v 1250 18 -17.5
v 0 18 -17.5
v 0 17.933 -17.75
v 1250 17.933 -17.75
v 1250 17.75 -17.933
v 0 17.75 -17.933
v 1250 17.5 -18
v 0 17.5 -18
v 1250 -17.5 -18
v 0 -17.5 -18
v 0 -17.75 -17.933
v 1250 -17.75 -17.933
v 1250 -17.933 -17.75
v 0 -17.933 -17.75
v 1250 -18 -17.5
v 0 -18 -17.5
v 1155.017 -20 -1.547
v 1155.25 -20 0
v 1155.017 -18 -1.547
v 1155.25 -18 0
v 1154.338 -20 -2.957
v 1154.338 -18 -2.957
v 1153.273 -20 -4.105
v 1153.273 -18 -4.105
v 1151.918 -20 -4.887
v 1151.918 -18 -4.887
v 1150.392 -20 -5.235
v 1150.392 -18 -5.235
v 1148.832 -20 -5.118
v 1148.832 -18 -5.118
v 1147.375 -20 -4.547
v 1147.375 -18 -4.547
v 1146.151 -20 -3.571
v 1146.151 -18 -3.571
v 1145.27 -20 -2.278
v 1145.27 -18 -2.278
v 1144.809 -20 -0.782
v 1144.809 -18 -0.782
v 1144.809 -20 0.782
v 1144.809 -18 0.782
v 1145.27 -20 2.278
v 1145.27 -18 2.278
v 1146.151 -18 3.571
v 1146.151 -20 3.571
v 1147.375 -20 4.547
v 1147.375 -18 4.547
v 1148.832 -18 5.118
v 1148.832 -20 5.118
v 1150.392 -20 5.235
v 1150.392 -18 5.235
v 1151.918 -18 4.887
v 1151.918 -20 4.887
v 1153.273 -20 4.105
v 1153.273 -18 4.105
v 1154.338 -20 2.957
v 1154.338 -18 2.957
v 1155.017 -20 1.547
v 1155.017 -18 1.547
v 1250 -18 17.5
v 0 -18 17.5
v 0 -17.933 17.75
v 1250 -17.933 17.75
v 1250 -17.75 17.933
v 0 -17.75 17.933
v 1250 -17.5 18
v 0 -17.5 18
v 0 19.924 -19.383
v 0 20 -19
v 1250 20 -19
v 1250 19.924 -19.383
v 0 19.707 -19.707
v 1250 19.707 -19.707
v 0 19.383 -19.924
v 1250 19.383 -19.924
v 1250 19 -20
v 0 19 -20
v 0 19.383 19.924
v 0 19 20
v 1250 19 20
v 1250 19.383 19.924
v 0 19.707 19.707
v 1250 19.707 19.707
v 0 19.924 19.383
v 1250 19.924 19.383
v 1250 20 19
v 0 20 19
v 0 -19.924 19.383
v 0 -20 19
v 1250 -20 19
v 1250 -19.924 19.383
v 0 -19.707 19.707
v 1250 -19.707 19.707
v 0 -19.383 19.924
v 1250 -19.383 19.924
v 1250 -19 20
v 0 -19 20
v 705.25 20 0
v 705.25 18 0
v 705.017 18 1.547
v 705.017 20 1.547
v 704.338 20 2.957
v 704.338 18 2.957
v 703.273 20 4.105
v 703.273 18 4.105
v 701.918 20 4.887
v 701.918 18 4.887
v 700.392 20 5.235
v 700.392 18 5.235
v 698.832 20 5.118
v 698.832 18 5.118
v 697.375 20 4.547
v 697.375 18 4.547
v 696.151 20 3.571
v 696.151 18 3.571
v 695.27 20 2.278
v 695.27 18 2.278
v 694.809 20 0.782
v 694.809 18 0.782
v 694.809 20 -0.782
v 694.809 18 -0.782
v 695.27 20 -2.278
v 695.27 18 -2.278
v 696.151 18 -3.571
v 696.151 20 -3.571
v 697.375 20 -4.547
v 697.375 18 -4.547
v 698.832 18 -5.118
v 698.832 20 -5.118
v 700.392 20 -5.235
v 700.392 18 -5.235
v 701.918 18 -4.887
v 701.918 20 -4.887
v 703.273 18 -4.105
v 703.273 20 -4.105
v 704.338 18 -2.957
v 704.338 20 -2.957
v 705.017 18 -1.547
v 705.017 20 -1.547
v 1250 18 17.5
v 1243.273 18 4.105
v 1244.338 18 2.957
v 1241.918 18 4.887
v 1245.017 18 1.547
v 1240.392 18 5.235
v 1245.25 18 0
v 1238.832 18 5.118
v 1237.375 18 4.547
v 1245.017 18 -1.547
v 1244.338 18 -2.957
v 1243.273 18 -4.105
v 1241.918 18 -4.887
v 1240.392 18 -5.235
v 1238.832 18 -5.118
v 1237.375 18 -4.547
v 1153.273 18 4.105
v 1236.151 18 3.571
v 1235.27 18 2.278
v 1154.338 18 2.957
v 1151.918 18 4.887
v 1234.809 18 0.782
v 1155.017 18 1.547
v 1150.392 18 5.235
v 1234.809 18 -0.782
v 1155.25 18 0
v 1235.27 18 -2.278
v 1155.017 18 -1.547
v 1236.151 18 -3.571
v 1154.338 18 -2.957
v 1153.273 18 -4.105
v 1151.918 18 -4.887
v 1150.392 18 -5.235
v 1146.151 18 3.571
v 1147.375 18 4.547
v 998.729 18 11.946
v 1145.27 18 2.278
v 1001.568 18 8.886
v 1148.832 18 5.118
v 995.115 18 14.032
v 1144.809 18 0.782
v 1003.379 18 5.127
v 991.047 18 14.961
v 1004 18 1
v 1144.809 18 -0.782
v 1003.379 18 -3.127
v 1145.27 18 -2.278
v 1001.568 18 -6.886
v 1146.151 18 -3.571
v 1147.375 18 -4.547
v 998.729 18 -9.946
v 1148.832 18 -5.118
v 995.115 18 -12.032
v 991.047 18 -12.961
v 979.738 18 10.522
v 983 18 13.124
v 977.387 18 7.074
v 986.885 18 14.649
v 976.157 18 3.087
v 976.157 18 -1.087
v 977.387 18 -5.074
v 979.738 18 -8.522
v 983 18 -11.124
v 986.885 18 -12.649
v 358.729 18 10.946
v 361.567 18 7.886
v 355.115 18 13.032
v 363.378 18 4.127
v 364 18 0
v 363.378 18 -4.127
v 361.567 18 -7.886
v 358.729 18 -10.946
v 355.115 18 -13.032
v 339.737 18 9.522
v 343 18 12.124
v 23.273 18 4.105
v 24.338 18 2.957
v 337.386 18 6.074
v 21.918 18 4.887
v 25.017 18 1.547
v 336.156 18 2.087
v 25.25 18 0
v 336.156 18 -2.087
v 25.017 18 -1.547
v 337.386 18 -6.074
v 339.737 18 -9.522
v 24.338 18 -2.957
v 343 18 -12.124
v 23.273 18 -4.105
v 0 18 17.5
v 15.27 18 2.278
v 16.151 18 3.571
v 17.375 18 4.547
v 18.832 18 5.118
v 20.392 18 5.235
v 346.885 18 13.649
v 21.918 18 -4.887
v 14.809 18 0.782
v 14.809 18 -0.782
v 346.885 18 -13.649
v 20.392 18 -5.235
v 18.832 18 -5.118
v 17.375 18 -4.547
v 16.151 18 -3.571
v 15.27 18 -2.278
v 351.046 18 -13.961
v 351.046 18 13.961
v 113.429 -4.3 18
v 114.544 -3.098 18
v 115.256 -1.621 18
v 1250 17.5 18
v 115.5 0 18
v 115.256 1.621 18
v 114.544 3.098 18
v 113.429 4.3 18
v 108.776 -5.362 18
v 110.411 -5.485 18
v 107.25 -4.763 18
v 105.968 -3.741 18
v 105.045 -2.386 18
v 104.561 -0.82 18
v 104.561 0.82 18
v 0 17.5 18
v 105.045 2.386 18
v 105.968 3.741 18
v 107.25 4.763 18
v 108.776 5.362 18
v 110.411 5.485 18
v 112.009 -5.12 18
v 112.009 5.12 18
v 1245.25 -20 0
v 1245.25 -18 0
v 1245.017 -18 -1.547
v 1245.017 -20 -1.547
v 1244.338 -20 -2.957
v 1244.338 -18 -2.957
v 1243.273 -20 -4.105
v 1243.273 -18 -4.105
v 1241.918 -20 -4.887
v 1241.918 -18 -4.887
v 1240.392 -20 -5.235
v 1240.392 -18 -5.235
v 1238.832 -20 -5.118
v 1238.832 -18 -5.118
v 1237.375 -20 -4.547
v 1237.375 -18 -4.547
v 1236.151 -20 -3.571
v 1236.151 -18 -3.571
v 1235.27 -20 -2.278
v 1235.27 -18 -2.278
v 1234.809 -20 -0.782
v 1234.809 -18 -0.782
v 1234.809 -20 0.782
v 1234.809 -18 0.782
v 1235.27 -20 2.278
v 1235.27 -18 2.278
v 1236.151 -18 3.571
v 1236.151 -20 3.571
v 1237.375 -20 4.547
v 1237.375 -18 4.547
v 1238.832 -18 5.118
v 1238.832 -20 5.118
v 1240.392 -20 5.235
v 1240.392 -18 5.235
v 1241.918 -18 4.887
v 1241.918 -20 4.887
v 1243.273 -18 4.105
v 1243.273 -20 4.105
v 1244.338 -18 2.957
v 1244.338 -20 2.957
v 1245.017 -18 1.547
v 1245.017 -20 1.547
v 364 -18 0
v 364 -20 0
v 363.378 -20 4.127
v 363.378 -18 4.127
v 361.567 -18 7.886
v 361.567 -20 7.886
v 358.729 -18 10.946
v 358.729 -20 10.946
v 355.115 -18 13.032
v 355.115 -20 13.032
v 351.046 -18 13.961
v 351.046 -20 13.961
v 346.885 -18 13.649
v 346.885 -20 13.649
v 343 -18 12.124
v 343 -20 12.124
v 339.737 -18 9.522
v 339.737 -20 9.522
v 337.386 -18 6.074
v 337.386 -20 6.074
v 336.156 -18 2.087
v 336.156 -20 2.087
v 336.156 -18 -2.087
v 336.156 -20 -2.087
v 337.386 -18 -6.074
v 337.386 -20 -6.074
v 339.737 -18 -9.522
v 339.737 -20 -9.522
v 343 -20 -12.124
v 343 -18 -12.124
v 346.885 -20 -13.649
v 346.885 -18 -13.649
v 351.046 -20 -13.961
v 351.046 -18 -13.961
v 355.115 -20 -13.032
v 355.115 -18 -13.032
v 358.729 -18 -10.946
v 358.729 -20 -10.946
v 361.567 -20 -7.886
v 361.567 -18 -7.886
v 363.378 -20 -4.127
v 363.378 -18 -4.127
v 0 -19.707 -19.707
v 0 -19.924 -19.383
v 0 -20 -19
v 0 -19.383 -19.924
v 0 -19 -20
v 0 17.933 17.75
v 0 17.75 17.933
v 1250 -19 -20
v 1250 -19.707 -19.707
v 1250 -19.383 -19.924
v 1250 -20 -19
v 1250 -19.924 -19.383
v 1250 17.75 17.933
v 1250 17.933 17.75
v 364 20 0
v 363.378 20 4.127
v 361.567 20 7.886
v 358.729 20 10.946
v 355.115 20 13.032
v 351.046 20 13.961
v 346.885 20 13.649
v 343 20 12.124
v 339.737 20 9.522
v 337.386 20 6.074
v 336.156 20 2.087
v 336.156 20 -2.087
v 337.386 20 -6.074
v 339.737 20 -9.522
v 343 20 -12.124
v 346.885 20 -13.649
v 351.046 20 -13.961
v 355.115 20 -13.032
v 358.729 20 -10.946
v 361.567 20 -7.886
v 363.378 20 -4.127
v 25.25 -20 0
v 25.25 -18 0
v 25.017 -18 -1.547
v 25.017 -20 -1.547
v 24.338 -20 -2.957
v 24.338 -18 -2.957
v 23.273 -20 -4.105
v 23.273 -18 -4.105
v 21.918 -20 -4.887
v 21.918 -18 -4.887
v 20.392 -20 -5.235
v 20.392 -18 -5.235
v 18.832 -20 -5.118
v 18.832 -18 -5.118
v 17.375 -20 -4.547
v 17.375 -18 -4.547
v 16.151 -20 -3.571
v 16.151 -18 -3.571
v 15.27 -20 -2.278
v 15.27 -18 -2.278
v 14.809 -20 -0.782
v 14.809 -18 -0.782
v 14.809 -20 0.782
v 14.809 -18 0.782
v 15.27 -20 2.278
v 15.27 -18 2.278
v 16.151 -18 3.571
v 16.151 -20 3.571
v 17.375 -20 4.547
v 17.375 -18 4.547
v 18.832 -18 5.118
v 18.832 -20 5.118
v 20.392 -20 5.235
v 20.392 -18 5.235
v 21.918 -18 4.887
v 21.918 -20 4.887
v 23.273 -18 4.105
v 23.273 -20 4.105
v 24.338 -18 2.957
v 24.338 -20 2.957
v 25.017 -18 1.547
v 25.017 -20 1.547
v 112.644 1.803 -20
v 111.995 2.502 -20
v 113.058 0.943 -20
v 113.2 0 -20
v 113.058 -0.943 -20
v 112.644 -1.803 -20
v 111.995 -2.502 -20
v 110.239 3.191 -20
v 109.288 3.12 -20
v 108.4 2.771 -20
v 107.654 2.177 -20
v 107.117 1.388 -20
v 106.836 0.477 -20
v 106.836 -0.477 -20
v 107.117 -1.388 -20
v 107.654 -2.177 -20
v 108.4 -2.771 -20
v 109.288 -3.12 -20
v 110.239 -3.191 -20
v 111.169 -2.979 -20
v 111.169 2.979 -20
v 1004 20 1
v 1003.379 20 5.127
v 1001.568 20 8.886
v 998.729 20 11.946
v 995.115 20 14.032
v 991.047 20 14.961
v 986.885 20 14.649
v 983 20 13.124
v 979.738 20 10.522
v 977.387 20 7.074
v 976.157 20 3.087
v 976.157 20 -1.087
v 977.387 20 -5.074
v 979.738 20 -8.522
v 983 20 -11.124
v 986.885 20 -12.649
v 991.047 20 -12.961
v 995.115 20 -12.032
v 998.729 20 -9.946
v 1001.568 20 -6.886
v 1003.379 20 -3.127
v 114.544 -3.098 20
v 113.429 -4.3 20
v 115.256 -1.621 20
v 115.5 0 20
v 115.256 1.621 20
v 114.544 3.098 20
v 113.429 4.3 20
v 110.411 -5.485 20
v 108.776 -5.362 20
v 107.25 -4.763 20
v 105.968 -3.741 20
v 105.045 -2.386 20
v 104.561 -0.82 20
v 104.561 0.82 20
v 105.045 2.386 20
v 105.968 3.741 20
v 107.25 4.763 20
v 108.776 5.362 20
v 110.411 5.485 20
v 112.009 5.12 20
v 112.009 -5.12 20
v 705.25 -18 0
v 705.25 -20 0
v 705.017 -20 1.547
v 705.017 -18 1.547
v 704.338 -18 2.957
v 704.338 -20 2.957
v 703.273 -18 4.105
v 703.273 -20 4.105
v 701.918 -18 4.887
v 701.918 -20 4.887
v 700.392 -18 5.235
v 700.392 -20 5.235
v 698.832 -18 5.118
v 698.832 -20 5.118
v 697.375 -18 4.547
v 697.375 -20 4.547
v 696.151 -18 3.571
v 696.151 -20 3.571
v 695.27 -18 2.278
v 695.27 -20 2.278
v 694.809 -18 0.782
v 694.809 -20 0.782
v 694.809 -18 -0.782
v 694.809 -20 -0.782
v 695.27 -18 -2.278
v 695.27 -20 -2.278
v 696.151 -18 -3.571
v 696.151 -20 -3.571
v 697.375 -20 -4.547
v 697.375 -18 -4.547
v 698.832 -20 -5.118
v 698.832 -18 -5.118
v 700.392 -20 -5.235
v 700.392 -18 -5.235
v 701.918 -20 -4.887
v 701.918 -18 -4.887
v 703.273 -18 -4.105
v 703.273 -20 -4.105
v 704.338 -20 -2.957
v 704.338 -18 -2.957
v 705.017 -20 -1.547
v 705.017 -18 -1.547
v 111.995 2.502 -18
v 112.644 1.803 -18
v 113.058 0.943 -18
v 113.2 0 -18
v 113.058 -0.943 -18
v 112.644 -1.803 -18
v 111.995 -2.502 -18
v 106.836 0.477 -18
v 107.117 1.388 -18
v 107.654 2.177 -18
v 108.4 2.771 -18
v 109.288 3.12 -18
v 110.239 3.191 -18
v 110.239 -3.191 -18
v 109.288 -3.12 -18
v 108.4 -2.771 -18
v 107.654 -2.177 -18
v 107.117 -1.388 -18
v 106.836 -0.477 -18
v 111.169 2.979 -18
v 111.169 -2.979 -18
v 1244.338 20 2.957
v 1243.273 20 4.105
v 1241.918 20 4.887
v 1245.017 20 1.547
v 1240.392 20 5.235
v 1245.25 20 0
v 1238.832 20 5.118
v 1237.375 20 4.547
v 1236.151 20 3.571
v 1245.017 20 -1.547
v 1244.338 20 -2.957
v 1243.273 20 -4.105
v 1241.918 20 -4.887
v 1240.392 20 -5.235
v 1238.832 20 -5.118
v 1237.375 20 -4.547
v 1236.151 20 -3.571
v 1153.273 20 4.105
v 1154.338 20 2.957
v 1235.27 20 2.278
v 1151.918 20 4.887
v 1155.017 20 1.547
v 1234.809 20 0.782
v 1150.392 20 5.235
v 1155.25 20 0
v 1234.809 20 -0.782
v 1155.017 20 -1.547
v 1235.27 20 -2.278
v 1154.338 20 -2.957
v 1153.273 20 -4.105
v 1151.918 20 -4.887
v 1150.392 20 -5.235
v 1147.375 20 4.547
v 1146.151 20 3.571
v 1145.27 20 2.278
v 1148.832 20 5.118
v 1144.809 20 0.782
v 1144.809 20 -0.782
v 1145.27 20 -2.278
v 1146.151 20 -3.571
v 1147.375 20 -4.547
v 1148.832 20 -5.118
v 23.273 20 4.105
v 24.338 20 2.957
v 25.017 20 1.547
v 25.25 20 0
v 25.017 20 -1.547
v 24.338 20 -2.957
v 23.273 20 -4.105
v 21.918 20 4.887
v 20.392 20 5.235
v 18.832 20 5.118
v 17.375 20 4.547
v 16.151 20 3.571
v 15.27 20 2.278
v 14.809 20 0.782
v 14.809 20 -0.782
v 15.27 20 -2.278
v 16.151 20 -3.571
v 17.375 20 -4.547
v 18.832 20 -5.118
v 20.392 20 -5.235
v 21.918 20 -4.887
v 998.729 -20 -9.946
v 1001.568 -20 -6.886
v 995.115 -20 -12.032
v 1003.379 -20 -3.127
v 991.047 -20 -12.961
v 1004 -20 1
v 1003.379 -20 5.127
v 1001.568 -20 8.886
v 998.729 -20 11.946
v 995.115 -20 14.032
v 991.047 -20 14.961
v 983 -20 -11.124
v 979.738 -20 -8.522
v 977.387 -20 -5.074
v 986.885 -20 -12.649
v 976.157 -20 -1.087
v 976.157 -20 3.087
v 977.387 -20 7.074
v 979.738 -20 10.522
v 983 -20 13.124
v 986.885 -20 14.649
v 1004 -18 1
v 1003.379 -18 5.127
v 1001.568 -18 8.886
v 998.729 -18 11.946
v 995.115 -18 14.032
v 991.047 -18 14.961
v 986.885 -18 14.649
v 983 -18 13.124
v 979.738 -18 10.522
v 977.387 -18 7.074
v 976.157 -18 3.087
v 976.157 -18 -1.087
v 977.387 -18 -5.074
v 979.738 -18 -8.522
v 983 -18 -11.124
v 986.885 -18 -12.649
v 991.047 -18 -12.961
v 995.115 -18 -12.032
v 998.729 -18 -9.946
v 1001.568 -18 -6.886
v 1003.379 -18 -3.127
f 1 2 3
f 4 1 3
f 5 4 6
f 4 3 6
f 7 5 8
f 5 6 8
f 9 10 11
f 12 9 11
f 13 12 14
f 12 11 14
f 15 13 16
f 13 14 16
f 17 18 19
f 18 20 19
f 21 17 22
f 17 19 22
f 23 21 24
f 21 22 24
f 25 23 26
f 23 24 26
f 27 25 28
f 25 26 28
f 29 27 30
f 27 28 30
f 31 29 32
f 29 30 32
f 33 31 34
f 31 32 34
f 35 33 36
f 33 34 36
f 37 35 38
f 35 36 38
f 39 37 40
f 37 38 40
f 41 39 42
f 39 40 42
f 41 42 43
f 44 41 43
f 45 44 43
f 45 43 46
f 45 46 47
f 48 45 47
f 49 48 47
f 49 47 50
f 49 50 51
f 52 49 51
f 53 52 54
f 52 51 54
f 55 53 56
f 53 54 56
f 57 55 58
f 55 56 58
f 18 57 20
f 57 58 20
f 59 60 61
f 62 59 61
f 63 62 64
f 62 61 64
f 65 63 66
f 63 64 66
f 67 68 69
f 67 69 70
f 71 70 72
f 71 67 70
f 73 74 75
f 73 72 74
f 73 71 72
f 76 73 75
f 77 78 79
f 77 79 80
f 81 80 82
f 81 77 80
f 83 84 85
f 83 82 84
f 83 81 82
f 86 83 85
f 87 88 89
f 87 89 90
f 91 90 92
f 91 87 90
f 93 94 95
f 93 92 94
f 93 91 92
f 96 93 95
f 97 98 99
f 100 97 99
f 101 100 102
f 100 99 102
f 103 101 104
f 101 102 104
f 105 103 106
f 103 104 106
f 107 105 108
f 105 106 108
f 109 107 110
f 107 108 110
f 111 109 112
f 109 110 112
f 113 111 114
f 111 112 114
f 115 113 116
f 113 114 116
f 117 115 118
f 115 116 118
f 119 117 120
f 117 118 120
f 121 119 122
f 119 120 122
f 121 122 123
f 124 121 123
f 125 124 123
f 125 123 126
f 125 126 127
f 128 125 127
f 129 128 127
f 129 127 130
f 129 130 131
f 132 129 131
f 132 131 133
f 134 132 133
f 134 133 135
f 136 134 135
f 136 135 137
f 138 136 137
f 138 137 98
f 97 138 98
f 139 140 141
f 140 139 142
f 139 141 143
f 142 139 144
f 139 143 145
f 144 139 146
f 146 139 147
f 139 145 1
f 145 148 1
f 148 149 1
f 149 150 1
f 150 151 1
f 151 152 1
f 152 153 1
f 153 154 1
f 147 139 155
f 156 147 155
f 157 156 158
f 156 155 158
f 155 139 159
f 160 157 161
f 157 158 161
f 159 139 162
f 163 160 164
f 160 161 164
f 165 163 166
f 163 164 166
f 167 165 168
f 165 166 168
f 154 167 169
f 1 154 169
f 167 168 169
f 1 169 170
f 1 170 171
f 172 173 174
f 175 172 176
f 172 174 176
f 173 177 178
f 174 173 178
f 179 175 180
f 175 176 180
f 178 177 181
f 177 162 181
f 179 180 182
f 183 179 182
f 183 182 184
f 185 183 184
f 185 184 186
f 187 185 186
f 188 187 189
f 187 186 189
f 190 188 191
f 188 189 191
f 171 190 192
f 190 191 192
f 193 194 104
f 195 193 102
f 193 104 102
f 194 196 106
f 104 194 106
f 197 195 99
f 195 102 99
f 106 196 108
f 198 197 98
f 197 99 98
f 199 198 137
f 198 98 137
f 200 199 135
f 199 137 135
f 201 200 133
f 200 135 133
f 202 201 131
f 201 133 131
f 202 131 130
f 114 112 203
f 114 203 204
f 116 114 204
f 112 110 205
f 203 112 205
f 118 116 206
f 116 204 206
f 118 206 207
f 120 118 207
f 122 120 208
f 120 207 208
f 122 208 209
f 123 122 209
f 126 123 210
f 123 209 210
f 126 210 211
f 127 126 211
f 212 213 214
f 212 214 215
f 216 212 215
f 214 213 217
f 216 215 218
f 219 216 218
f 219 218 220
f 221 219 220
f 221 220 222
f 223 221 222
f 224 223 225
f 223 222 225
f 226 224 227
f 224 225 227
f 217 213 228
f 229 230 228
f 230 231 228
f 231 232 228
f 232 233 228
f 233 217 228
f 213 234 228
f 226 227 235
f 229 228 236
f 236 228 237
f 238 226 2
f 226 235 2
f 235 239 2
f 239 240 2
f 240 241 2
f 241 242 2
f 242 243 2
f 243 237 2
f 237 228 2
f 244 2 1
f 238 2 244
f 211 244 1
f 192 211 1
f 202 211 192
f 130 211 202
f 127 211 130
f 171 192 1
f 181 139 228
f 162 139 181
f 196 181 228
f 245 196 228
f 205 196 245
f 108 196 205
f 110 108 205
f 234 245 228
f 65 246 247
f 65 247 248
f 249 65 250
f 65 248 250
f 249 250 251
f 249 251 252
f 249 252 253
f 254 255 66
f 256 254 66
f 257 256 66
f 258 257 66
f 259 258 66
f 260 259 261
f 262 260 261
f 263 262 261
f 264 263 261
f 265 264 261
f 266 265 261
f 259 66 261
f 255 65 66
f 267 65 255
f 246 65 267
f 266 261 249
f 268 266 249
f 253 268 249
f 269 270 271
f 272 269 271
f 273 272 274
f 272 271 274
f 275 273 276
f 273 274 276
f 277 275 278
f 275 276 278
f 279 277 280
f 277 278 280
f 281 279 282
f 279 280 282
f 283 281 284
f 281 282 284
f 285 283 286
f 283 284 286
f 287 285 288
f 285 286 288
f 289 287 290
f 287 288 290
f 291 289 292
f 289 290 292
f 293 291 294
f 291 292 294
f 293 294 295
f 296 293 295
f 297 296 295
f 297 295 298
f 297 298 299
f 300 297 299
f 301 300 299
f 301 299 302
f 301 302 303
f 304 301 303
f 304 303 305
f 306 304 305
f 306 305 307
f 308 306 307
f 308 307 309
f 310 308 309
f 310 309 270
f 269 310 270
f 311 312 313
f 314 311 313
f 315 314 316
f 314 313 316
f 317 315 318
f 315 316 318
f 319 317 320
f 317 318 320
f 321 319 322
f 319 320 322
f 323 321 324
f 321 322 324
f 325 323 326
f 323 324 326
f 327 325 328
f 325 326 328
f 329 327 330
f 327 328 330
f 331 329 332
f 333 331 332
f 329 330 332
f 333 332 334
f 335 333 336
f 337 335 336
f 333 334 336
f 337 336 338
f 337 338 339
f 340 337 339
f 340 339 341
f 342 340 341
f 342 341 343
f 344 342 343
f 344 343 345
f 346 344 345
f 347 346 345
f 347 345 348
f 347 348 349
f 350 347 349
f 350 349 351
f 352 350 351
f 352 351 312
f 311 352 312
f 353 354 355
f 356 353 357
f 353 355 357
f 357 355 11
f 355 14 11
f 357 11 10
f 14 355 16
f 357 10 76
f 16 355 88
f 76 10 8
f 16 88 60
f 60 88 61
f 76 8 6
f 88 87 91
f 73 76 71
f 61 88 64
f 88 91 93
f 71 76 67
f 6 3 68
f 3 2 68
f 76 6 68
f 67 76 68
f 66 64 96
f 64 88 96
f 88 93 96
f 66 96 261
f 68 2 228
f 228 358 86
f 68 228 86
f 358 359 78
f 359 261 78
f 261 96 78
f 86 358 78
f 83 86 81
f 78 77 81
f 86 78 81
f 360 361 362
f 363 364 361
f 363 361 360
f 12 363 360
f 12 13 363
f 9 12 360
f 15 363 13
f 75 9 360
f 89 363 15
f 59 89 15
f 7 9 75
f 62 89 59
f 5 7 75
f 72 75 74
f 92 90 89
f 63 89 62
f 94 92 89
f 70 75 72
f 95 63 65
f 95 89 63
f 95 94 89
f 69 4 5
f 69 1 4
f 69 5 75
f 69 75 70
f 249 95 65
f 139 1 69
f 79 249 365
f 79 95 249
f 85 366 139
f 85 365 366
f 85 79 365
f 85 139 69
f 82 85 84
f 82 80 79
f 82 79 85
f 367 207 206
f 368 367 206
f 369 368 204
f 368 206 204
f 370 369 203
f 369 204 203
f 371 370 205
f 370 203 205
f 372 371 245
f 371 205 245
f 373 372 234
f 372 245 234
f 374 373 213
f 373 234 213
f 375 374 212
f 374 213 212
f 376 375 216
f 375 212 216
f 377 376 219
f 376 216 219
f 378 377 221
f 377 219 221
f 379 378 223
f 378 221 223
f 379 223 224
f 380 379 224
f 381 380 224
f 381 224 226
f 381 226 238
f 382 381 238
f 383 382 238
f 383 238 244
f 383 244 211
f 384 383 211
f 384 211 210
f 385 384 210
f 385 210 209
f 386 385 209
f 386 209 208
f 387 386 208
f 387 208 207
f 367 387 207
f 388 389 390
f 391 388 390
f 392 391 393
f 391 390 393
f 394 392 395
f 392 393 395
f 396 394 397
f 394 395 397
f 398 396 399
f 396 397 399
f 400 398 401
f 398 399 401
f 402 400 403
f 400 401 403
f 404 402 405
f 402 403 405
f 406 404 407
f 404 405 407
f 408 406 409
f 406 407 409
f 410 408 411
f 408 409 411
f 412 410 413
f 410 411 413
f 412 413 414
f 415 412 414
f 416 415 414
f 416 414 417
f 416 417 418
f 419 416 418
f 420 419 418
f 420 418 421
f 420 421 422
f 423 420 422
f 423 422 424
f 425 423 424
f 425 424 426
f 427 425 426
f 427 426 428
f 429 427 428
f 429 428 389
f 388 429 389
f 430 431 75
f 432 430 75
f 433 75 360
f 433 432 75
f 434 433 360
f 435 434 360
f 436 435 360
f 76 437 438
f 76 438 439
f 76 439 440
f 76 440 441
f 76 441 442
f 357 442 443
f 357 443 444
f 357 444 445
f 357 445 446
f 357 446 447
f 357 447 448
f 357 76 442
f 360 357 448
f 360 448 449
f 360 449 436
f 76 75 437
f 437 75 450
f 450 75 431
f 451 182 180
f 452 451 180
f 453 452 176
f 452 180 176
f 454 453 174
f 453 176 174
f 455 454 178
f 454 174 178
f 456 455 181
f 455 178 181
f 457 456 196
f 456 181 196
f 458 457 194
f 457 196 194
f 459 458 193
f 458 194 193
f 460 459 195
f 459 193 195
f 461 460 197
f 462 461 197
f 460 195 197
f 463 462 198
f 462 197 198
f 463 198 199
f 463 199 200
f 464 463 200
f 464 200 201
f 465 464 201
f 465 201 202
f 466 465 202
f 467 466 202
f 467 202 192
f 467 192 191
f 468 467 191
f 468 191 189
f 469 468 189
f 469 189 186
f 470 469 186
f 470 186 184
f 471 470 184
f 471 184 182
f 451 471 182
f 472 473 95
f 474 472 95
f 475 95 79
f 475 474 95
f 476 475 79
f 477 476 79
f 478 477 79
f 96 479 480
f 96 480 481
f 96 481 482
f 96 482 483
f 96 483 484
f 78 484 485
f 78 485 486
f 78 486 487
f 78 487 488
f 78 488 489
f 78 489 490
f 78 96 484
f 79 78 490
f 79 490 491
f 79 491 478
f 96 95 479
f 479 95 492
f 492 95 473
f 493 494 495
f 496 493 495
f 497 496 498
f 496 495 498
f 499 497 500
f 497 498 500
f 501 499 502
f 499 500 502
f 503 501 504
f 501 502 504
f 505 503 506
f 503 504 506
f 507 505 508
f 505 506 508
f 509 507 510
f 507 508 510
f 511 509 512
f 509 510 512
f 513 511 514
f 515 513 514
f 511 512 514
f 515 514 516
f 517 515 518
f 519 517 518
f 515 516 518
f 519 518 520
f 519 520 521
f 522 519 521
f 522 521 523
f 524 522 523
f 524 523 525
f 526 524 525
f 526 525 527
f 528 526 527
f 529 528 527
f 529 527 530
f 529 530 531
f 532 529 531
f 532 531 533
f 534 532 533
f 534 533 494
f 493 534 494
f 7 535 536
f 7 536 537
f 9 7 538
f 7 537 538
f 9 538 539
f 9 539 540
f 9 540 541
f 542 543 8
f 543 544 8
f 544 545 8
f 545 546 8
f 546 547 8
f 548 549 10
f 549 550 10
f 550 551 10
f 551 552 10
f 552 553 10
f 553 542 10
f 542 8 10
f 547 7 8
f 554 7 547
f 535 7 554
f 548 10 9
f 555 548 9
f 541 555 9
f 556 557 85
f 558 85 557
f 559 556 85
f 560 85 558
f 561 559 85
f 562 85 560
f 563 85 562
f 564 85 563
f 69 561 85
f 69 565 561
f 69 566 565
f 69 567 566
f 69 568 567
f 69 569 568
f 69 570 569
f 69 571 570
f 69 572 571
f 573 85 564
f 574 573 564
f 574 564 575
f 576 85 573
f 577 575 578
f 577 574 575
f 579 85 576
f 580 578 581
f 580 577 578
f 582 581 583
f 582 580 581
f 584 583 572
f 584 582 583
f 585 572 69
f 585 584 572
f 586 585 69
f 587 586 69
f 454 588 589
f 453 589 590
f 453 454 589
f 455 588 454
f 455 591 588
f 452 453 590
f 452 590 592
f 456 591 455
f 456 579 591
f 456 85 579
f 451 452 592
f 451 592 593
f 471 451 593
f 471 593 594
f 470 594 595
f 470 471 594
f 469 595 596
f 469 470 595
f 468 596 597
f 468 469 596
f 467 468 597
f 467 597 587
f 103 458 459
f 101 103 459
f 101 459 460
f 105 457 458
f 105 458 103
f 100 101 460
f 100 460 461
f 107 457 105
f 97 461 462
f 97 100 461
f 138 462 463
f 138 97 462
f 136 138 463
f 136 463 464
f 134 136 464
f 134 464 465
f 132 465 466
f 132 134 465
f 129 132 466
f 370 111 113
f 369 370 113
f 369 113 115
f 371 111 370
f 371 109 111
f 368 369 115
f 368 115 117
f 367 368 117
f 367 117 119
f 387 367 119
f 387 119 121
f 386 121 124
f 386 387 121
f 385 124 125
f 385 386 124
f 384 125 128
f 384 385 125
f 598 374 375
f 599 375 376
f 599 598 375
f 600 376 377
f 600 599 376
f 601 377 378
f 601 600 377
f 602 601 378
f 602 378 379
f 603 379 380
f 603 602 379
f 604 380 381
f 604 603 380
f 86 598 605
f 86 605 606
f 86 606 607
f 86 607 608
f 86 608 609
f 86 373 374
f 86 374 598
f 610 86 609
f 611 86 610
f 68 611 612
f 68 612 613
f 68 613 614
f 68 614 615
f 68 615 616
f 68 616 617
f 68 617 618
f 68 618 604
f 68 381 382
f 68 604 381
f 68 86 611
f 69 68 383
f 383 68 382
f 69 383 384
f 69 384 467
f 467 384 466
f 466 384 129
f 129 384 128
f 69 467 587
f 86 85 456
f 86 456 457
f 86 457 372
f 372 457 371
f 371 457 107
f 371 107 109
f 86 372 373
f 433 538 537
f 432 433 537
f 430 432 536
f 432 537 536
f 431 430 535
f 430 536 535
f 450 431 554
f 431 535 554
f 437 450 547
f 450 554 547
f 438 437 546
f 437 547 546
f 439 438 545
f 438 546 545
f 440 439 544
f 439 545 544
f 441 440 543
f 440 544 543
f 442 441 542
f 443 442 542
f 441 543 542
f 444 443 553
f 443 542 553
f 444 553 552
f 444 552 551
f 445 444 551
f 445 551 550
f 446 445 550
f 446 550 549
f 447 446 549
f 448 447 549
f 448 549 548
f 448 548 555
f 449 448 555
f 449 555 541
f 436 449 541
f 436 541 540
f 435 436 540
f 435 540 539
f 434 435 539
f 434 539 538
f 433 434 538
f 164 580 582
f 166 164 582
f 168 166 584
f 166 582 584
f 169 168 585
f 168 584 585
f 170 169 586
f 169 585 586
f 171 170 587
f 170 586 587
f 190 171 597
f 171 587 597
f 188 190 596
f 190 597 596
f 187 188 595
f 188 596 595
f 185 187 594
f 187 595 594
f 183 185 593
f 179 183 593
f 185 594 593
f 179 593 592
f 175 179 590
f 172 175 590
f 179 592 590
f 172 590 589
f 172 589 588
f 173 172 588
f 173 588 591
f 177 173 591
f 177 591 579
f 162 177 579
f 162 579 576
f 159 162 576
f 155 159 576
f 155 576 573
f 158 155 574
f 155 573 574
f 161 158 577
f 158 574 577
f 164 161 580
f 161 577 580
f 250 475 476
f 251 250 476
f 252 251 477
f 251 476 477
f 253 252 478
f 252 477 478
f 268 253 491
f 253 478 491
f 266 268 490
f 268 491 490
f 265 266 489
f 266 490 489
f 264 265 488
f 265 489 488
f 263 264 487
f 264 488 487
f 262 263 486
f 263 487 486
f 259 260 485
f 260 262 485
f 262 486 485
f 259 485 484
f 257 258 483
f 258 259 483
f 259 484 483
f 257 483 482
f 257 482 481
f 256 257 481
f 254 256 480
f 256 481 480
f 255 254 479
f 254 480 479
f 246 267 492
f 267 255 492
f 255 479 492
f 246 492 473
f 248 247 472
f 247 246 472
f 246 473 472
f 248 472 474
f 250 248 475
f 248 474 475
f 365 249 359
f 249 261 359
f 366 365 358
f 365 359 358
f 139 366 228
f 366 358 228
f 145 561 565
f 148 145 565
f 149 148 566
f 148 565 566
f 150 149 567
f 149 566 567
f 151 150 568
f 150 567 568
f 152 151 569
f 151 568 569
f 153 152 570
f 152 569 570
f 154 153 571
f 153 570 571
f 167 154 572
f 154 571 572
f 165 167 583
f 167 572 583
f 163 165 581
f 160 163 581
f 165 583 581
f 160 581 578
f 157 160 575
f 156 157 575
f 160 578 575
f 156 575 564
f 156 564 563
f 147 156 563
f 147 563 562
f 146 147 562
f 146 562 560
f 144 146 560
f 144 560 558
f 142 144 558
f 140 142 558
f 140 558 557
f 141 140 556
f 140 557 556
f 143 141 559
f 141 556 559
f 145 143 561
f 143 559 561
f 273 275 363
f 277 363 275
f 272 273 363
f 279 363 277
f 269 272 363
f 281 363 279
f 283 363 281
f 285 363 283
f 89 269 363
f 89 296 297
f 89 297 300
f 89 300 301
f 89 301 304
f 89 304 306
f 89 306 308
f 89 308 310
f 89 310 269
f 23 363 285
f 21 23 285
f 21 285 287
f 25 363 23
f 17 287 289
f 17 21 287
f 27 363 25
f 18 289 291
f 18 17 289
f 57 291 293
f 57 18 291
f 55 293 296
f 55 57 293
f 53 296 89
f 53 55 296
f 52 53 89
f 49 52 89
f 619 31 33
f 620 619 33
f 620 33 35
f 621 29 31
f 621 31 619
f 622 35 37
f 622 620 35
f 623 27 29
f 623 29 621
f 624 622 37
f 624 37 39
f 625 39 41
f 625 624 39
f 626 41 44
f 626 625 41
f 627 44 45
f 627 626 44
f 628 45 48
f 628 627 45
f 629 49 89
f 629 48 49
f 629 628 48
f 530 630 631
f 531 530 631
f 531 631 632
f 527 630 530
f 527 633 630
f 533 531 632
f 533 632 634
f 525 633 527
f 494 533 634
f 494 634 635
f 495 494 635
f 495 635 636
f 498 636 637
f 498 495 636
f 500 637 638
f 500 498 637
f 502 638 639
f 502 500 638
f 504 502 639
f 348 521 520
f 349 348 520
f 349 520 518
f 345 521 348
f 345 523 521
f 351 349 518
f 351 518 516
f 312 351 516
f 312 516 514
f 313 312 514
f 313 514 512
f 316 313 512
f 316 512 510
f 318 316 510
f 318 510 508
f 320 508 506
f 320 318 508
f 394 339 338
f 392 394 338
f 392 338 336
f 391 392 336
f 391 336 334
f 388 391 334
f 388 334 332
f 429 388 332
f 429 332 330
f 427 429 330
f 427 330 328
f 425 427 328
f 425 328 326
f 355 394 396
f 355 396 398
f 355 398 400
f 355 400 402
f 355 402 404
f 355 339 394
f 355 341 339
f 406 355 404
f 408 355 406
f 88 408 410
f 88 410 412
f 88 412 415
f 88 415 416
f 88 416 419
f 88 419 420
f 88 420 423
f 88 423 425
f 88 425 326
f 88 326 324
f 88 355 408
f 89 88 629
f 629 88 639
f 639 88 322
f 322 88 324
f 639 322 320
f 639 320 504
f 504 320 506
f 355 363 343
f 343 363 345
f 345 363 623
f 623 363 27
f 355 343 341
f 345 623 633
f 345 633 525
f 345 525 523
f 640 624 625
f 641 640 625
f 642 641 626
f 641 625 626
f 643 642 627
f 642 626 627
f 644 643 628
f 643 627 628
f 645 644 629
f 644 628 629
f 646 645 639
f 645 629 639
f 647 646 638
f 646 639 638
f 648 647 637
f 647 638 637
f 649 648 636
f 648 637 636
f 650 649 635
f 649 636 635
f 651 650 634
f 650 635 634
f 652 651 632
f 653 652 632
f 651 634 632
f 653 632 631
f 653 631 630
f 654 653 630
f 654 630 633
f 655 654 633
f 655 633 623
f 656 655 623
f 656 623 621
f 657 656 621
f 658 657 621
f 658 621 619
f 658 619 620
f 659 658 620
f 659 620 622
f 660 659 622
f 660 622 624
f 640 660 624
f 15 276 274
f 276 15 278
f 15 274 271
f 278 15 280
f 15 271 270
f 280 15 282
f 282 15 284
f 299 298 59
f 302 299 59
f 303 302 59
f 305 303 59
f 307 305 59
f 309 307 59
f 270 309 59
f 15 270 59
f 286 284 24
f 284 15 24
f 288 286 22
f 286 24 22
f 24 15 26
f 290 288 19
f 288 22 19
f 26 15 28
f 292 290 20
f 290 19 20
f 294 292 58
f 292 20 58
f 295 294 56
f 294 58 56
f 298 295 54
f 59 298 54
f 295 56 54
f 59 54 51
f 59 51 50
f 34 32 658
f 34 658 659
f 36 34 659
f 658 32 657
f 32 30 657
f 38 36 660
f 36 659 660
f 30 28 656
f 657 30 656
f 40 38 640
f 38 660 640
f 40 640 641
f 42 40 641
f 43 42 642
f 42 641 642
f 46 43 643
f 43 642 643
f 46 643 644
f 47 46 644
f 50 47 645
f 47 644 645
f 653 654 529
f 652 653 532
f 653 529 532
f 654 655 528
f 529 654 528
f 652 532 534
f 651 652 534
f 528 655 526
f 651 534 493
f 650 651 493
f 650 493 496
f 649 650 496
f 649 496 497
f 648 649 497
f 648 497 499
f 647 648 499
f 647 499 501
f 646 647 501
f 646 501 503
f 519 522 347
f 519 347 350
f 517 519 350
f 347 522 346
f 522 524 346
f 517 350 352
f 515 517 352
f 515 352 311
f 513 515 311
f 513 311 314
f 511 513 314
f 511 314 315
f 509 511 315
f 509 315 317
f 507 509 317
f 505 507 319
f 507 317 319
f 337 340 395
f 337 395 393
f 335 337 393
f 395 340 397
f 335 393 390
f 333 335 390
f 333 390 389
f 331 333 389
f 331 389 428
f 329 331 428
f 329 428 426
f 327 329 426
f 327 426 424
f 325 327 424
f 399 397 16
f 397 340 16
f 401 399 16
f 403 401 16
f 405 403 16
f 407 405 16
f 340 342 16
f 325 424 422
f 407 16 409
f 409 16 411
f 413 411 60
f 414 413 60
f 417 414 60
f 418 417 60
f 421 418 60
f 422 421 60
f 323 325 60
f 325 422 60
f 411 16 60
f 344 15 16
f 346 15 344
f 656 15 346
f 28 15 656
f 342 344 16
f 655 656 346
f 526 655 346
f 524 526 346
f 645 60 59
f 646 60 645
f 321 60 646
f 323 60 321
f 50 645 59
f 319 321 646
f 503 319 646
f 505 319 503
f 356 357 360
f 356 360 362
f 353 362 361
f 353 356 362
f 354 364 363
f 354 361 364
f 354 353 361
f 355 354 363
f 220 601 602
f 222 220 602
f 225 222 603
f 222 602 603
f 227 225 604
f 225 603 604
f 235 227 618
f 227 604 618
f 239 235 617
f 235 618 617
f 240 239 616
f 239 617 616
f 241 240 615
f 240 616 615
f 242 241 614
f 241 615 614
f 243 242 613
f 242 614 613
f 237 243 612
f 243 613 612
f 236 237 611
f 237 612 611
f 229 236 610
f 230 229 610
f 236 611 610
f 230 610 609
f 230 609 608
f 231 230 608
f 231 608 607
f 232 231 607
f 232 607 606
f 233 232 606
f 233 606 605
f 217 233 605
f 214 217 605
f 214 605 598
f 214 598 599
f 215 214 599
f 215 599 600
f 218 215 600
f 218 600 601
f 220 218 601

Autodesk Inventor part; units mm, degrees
ref_plane "YZ Plane" through (0, 0, 0) normal (1, 0, 0) x (0, 1, 0)
ref_plane "XZ Plane" through (0, 0, 0) normal (0, 1, 0) x (-1, 0, 0)
ref_plane "XY Plane" through (0, 0, 0) normal (0, 0, 1) x (1, 0, 0)
sketch "Skizze1" plane through (0, 0, 0) normal (1, 0, 0) x (0, 1, 0)
  line L0 (-19, 20) -> (19, 20)
  line L1 (20, 19) -> (20, -19)
  line L2 (19, -20) -> (-19, -20)
  line L3 (-20, -19) -> (-20, 19)
  line L4 (-20, 20) -> (20, -20) construction
  line L5 (20, 20) -> (-20, -20) construction
  line L6 (-17.5, 18) -> (17.5, 18)
  line L7 (18, 17.5) -> (18, -17.5)
  line L8 (17.5, -18) -> (-17.5, -18)
  line L9 (-18, -17.5) -> (-18, 17.5)
  line L10 (-18, 18) -> (18, -18) construction
  line L11 (18, 18) -> (-18, -18) construction
  arc A0 (20, 19) -> (19, 20) centre (19, 19) ccw
  arc A1 (-19, 20) -> (-20, 19) centre (-19, 19) ccw
  arc A2 (-20, -19) -> (-19, -20) centre (-19, -19) ccw
  arc A3 (19, -20) -> (20, -19) centre (19, -19) ccw
  arc A4 (18, 17.5) -> (17.5, 18) centre (17.5, 17.5) ccw
  arc A5 (-17.5, 18) -> (-18, 17.5) centre (-17.5, 17.5) ccw
  arc A6 (17.5, -18) -> (18, -17.5) centre (17.5, -17.5) ccw
  arc A7 (-18, -17.5) -> (-17.5, -18) centre (-17.5, -17.5) ccw
  point P0 (0, 0)
  dimension "d0" = 40
  dimension "d1" = 40
  dimension "d2" = 36
  dimension "d3" = 36
  dimension "d4" = 1
  dimension "d5" = 0.5
extrude "Extrusion1" add sketch "Skizze1" along normal blind 1250
sketch "Skizze2" plane through (0, 20, 19) normal (0, 1, 0) x (1, 0, 0)
  line L0 (0, 19) -> (20, 19)
  line L1 (1250, 38) -> (1250, 0) projected
  line L2 (1250, 19) -> (1150, 19)
  circle A0 centre (1150, 19) radius 5.25
  circle A1 centre (20, 19) radius 5.25
  dimension "d9" = 20
  dimension "d10" = 100
  dimension "d11" = 10.5
  dimension "d12" = 10.5
extrude "Extrusion2" cut sketch "Skizze2" against normal blind 1250
sketch "Skizze3" plane through (0, -19, 20) normal (0, 0, 1) x (1, 0, 0)
  line L0 (0, 19) -> (110, 19)
  line L1 (1250, 0) -> (1250, 38) projected
  line L2 (1250, 19) -> (1240, 19)
  circle A0 centre (110, 19) radius 3.2
  dimension "d15" = 110
  dimension "d18" = 6.4
extrude "Extrusion3" cut sketch "Skizze3" against normal blind 1250
sketch "Skizze4" plane through (0, -19, 20) normal (0, 0, 1) x (1, 0, 0)
  line L0 (0, 19) -> (110, 19)
  circle A0 centre (110, 19) radius 5.5
  dimension "d21" = 110
  dimension "d22" = 11
extrude "Extrusion4" cut sketch "Skizze4" against normal blind 2
sketch "Skizze6" plane through (0, -20, -19) normal (0, -1, 0) x (1, 0, 0)
  circle A0 centre (1150, 19) radius 5.25 projected
  line L0 (1150, 19) -> (350, 19)
  circle A1 centre (350, 19) radius 14
  point P0 (0, 19)
  dimension "d31" = 800
  dimension "d32" = 28
extrude "Extrusion6" cut sketch "Skizze6" against normal blind 40 contours A1
sketch "Skizze7" plane through (0, 20, 19) normal (0, 1, 0) x (1, 0, 0)
  line L0 (1250, 38) -> (1250, 0) projected
  line L1 (1250, 19) -> (1240, 19)
  circle A0 centre (1240, 19) radius 5.25
  point P0 (0, 19)
  dimension "d35" = 10
  dimension "d36" = 10.5
extrude "Extrusion7" cut sketch "Skizze7" against normal through all
sketch "Skizze8" plane through (0, -20, -19) normal (0, -1, 0) x (1, 0, 0)
  line L0 (1250, 1.5) -> (1250, 1) projected
  line L1 (1250, 1) -> (990.0005, 1.5)
  line L2 (0, 1.5) -> (1250, 1.5) projected
  line L3 (990.0005, 1.5) -> (970.0005, 1.5)
  line L4 (0, 0) -> (1250, 0) projected
  line L5 (990.0005, 0) -> (970.0005, 0)
  line L6 (990.0005, 0) -> (990.0005, 20)
  circle A0 centre (990.0005, 20) radius 14
  point P0 (0, 19)
  dimension "d39" = 260
  dimension "d40" = 20
  dimension "d41" = 20
  dimension "d42" = 20
  dimension "d43" = 28
extrude "Extrusion8" cut sketch "Skizze8" against normal through all contours A0
sketch "Skizze9" plane through (0, -20, -19) normal (0, -1, 0) x (1, 0, 0)
  line L0 (1250, 1.5) -> (1250, 36.5) projected
  line L1 (1250, 19) -> (700, 19)
  circle A0 centre (700, 19) radius 5.25
  point P0 (0, 19)
  dimension "d46" = 550
  dimension "d47" = 10.5
extrude "Extrusion9" cut sketch "Skizze9" against normal through all
properties part number "Längs_Traverse_vorne" material "Aluminium 6061"
